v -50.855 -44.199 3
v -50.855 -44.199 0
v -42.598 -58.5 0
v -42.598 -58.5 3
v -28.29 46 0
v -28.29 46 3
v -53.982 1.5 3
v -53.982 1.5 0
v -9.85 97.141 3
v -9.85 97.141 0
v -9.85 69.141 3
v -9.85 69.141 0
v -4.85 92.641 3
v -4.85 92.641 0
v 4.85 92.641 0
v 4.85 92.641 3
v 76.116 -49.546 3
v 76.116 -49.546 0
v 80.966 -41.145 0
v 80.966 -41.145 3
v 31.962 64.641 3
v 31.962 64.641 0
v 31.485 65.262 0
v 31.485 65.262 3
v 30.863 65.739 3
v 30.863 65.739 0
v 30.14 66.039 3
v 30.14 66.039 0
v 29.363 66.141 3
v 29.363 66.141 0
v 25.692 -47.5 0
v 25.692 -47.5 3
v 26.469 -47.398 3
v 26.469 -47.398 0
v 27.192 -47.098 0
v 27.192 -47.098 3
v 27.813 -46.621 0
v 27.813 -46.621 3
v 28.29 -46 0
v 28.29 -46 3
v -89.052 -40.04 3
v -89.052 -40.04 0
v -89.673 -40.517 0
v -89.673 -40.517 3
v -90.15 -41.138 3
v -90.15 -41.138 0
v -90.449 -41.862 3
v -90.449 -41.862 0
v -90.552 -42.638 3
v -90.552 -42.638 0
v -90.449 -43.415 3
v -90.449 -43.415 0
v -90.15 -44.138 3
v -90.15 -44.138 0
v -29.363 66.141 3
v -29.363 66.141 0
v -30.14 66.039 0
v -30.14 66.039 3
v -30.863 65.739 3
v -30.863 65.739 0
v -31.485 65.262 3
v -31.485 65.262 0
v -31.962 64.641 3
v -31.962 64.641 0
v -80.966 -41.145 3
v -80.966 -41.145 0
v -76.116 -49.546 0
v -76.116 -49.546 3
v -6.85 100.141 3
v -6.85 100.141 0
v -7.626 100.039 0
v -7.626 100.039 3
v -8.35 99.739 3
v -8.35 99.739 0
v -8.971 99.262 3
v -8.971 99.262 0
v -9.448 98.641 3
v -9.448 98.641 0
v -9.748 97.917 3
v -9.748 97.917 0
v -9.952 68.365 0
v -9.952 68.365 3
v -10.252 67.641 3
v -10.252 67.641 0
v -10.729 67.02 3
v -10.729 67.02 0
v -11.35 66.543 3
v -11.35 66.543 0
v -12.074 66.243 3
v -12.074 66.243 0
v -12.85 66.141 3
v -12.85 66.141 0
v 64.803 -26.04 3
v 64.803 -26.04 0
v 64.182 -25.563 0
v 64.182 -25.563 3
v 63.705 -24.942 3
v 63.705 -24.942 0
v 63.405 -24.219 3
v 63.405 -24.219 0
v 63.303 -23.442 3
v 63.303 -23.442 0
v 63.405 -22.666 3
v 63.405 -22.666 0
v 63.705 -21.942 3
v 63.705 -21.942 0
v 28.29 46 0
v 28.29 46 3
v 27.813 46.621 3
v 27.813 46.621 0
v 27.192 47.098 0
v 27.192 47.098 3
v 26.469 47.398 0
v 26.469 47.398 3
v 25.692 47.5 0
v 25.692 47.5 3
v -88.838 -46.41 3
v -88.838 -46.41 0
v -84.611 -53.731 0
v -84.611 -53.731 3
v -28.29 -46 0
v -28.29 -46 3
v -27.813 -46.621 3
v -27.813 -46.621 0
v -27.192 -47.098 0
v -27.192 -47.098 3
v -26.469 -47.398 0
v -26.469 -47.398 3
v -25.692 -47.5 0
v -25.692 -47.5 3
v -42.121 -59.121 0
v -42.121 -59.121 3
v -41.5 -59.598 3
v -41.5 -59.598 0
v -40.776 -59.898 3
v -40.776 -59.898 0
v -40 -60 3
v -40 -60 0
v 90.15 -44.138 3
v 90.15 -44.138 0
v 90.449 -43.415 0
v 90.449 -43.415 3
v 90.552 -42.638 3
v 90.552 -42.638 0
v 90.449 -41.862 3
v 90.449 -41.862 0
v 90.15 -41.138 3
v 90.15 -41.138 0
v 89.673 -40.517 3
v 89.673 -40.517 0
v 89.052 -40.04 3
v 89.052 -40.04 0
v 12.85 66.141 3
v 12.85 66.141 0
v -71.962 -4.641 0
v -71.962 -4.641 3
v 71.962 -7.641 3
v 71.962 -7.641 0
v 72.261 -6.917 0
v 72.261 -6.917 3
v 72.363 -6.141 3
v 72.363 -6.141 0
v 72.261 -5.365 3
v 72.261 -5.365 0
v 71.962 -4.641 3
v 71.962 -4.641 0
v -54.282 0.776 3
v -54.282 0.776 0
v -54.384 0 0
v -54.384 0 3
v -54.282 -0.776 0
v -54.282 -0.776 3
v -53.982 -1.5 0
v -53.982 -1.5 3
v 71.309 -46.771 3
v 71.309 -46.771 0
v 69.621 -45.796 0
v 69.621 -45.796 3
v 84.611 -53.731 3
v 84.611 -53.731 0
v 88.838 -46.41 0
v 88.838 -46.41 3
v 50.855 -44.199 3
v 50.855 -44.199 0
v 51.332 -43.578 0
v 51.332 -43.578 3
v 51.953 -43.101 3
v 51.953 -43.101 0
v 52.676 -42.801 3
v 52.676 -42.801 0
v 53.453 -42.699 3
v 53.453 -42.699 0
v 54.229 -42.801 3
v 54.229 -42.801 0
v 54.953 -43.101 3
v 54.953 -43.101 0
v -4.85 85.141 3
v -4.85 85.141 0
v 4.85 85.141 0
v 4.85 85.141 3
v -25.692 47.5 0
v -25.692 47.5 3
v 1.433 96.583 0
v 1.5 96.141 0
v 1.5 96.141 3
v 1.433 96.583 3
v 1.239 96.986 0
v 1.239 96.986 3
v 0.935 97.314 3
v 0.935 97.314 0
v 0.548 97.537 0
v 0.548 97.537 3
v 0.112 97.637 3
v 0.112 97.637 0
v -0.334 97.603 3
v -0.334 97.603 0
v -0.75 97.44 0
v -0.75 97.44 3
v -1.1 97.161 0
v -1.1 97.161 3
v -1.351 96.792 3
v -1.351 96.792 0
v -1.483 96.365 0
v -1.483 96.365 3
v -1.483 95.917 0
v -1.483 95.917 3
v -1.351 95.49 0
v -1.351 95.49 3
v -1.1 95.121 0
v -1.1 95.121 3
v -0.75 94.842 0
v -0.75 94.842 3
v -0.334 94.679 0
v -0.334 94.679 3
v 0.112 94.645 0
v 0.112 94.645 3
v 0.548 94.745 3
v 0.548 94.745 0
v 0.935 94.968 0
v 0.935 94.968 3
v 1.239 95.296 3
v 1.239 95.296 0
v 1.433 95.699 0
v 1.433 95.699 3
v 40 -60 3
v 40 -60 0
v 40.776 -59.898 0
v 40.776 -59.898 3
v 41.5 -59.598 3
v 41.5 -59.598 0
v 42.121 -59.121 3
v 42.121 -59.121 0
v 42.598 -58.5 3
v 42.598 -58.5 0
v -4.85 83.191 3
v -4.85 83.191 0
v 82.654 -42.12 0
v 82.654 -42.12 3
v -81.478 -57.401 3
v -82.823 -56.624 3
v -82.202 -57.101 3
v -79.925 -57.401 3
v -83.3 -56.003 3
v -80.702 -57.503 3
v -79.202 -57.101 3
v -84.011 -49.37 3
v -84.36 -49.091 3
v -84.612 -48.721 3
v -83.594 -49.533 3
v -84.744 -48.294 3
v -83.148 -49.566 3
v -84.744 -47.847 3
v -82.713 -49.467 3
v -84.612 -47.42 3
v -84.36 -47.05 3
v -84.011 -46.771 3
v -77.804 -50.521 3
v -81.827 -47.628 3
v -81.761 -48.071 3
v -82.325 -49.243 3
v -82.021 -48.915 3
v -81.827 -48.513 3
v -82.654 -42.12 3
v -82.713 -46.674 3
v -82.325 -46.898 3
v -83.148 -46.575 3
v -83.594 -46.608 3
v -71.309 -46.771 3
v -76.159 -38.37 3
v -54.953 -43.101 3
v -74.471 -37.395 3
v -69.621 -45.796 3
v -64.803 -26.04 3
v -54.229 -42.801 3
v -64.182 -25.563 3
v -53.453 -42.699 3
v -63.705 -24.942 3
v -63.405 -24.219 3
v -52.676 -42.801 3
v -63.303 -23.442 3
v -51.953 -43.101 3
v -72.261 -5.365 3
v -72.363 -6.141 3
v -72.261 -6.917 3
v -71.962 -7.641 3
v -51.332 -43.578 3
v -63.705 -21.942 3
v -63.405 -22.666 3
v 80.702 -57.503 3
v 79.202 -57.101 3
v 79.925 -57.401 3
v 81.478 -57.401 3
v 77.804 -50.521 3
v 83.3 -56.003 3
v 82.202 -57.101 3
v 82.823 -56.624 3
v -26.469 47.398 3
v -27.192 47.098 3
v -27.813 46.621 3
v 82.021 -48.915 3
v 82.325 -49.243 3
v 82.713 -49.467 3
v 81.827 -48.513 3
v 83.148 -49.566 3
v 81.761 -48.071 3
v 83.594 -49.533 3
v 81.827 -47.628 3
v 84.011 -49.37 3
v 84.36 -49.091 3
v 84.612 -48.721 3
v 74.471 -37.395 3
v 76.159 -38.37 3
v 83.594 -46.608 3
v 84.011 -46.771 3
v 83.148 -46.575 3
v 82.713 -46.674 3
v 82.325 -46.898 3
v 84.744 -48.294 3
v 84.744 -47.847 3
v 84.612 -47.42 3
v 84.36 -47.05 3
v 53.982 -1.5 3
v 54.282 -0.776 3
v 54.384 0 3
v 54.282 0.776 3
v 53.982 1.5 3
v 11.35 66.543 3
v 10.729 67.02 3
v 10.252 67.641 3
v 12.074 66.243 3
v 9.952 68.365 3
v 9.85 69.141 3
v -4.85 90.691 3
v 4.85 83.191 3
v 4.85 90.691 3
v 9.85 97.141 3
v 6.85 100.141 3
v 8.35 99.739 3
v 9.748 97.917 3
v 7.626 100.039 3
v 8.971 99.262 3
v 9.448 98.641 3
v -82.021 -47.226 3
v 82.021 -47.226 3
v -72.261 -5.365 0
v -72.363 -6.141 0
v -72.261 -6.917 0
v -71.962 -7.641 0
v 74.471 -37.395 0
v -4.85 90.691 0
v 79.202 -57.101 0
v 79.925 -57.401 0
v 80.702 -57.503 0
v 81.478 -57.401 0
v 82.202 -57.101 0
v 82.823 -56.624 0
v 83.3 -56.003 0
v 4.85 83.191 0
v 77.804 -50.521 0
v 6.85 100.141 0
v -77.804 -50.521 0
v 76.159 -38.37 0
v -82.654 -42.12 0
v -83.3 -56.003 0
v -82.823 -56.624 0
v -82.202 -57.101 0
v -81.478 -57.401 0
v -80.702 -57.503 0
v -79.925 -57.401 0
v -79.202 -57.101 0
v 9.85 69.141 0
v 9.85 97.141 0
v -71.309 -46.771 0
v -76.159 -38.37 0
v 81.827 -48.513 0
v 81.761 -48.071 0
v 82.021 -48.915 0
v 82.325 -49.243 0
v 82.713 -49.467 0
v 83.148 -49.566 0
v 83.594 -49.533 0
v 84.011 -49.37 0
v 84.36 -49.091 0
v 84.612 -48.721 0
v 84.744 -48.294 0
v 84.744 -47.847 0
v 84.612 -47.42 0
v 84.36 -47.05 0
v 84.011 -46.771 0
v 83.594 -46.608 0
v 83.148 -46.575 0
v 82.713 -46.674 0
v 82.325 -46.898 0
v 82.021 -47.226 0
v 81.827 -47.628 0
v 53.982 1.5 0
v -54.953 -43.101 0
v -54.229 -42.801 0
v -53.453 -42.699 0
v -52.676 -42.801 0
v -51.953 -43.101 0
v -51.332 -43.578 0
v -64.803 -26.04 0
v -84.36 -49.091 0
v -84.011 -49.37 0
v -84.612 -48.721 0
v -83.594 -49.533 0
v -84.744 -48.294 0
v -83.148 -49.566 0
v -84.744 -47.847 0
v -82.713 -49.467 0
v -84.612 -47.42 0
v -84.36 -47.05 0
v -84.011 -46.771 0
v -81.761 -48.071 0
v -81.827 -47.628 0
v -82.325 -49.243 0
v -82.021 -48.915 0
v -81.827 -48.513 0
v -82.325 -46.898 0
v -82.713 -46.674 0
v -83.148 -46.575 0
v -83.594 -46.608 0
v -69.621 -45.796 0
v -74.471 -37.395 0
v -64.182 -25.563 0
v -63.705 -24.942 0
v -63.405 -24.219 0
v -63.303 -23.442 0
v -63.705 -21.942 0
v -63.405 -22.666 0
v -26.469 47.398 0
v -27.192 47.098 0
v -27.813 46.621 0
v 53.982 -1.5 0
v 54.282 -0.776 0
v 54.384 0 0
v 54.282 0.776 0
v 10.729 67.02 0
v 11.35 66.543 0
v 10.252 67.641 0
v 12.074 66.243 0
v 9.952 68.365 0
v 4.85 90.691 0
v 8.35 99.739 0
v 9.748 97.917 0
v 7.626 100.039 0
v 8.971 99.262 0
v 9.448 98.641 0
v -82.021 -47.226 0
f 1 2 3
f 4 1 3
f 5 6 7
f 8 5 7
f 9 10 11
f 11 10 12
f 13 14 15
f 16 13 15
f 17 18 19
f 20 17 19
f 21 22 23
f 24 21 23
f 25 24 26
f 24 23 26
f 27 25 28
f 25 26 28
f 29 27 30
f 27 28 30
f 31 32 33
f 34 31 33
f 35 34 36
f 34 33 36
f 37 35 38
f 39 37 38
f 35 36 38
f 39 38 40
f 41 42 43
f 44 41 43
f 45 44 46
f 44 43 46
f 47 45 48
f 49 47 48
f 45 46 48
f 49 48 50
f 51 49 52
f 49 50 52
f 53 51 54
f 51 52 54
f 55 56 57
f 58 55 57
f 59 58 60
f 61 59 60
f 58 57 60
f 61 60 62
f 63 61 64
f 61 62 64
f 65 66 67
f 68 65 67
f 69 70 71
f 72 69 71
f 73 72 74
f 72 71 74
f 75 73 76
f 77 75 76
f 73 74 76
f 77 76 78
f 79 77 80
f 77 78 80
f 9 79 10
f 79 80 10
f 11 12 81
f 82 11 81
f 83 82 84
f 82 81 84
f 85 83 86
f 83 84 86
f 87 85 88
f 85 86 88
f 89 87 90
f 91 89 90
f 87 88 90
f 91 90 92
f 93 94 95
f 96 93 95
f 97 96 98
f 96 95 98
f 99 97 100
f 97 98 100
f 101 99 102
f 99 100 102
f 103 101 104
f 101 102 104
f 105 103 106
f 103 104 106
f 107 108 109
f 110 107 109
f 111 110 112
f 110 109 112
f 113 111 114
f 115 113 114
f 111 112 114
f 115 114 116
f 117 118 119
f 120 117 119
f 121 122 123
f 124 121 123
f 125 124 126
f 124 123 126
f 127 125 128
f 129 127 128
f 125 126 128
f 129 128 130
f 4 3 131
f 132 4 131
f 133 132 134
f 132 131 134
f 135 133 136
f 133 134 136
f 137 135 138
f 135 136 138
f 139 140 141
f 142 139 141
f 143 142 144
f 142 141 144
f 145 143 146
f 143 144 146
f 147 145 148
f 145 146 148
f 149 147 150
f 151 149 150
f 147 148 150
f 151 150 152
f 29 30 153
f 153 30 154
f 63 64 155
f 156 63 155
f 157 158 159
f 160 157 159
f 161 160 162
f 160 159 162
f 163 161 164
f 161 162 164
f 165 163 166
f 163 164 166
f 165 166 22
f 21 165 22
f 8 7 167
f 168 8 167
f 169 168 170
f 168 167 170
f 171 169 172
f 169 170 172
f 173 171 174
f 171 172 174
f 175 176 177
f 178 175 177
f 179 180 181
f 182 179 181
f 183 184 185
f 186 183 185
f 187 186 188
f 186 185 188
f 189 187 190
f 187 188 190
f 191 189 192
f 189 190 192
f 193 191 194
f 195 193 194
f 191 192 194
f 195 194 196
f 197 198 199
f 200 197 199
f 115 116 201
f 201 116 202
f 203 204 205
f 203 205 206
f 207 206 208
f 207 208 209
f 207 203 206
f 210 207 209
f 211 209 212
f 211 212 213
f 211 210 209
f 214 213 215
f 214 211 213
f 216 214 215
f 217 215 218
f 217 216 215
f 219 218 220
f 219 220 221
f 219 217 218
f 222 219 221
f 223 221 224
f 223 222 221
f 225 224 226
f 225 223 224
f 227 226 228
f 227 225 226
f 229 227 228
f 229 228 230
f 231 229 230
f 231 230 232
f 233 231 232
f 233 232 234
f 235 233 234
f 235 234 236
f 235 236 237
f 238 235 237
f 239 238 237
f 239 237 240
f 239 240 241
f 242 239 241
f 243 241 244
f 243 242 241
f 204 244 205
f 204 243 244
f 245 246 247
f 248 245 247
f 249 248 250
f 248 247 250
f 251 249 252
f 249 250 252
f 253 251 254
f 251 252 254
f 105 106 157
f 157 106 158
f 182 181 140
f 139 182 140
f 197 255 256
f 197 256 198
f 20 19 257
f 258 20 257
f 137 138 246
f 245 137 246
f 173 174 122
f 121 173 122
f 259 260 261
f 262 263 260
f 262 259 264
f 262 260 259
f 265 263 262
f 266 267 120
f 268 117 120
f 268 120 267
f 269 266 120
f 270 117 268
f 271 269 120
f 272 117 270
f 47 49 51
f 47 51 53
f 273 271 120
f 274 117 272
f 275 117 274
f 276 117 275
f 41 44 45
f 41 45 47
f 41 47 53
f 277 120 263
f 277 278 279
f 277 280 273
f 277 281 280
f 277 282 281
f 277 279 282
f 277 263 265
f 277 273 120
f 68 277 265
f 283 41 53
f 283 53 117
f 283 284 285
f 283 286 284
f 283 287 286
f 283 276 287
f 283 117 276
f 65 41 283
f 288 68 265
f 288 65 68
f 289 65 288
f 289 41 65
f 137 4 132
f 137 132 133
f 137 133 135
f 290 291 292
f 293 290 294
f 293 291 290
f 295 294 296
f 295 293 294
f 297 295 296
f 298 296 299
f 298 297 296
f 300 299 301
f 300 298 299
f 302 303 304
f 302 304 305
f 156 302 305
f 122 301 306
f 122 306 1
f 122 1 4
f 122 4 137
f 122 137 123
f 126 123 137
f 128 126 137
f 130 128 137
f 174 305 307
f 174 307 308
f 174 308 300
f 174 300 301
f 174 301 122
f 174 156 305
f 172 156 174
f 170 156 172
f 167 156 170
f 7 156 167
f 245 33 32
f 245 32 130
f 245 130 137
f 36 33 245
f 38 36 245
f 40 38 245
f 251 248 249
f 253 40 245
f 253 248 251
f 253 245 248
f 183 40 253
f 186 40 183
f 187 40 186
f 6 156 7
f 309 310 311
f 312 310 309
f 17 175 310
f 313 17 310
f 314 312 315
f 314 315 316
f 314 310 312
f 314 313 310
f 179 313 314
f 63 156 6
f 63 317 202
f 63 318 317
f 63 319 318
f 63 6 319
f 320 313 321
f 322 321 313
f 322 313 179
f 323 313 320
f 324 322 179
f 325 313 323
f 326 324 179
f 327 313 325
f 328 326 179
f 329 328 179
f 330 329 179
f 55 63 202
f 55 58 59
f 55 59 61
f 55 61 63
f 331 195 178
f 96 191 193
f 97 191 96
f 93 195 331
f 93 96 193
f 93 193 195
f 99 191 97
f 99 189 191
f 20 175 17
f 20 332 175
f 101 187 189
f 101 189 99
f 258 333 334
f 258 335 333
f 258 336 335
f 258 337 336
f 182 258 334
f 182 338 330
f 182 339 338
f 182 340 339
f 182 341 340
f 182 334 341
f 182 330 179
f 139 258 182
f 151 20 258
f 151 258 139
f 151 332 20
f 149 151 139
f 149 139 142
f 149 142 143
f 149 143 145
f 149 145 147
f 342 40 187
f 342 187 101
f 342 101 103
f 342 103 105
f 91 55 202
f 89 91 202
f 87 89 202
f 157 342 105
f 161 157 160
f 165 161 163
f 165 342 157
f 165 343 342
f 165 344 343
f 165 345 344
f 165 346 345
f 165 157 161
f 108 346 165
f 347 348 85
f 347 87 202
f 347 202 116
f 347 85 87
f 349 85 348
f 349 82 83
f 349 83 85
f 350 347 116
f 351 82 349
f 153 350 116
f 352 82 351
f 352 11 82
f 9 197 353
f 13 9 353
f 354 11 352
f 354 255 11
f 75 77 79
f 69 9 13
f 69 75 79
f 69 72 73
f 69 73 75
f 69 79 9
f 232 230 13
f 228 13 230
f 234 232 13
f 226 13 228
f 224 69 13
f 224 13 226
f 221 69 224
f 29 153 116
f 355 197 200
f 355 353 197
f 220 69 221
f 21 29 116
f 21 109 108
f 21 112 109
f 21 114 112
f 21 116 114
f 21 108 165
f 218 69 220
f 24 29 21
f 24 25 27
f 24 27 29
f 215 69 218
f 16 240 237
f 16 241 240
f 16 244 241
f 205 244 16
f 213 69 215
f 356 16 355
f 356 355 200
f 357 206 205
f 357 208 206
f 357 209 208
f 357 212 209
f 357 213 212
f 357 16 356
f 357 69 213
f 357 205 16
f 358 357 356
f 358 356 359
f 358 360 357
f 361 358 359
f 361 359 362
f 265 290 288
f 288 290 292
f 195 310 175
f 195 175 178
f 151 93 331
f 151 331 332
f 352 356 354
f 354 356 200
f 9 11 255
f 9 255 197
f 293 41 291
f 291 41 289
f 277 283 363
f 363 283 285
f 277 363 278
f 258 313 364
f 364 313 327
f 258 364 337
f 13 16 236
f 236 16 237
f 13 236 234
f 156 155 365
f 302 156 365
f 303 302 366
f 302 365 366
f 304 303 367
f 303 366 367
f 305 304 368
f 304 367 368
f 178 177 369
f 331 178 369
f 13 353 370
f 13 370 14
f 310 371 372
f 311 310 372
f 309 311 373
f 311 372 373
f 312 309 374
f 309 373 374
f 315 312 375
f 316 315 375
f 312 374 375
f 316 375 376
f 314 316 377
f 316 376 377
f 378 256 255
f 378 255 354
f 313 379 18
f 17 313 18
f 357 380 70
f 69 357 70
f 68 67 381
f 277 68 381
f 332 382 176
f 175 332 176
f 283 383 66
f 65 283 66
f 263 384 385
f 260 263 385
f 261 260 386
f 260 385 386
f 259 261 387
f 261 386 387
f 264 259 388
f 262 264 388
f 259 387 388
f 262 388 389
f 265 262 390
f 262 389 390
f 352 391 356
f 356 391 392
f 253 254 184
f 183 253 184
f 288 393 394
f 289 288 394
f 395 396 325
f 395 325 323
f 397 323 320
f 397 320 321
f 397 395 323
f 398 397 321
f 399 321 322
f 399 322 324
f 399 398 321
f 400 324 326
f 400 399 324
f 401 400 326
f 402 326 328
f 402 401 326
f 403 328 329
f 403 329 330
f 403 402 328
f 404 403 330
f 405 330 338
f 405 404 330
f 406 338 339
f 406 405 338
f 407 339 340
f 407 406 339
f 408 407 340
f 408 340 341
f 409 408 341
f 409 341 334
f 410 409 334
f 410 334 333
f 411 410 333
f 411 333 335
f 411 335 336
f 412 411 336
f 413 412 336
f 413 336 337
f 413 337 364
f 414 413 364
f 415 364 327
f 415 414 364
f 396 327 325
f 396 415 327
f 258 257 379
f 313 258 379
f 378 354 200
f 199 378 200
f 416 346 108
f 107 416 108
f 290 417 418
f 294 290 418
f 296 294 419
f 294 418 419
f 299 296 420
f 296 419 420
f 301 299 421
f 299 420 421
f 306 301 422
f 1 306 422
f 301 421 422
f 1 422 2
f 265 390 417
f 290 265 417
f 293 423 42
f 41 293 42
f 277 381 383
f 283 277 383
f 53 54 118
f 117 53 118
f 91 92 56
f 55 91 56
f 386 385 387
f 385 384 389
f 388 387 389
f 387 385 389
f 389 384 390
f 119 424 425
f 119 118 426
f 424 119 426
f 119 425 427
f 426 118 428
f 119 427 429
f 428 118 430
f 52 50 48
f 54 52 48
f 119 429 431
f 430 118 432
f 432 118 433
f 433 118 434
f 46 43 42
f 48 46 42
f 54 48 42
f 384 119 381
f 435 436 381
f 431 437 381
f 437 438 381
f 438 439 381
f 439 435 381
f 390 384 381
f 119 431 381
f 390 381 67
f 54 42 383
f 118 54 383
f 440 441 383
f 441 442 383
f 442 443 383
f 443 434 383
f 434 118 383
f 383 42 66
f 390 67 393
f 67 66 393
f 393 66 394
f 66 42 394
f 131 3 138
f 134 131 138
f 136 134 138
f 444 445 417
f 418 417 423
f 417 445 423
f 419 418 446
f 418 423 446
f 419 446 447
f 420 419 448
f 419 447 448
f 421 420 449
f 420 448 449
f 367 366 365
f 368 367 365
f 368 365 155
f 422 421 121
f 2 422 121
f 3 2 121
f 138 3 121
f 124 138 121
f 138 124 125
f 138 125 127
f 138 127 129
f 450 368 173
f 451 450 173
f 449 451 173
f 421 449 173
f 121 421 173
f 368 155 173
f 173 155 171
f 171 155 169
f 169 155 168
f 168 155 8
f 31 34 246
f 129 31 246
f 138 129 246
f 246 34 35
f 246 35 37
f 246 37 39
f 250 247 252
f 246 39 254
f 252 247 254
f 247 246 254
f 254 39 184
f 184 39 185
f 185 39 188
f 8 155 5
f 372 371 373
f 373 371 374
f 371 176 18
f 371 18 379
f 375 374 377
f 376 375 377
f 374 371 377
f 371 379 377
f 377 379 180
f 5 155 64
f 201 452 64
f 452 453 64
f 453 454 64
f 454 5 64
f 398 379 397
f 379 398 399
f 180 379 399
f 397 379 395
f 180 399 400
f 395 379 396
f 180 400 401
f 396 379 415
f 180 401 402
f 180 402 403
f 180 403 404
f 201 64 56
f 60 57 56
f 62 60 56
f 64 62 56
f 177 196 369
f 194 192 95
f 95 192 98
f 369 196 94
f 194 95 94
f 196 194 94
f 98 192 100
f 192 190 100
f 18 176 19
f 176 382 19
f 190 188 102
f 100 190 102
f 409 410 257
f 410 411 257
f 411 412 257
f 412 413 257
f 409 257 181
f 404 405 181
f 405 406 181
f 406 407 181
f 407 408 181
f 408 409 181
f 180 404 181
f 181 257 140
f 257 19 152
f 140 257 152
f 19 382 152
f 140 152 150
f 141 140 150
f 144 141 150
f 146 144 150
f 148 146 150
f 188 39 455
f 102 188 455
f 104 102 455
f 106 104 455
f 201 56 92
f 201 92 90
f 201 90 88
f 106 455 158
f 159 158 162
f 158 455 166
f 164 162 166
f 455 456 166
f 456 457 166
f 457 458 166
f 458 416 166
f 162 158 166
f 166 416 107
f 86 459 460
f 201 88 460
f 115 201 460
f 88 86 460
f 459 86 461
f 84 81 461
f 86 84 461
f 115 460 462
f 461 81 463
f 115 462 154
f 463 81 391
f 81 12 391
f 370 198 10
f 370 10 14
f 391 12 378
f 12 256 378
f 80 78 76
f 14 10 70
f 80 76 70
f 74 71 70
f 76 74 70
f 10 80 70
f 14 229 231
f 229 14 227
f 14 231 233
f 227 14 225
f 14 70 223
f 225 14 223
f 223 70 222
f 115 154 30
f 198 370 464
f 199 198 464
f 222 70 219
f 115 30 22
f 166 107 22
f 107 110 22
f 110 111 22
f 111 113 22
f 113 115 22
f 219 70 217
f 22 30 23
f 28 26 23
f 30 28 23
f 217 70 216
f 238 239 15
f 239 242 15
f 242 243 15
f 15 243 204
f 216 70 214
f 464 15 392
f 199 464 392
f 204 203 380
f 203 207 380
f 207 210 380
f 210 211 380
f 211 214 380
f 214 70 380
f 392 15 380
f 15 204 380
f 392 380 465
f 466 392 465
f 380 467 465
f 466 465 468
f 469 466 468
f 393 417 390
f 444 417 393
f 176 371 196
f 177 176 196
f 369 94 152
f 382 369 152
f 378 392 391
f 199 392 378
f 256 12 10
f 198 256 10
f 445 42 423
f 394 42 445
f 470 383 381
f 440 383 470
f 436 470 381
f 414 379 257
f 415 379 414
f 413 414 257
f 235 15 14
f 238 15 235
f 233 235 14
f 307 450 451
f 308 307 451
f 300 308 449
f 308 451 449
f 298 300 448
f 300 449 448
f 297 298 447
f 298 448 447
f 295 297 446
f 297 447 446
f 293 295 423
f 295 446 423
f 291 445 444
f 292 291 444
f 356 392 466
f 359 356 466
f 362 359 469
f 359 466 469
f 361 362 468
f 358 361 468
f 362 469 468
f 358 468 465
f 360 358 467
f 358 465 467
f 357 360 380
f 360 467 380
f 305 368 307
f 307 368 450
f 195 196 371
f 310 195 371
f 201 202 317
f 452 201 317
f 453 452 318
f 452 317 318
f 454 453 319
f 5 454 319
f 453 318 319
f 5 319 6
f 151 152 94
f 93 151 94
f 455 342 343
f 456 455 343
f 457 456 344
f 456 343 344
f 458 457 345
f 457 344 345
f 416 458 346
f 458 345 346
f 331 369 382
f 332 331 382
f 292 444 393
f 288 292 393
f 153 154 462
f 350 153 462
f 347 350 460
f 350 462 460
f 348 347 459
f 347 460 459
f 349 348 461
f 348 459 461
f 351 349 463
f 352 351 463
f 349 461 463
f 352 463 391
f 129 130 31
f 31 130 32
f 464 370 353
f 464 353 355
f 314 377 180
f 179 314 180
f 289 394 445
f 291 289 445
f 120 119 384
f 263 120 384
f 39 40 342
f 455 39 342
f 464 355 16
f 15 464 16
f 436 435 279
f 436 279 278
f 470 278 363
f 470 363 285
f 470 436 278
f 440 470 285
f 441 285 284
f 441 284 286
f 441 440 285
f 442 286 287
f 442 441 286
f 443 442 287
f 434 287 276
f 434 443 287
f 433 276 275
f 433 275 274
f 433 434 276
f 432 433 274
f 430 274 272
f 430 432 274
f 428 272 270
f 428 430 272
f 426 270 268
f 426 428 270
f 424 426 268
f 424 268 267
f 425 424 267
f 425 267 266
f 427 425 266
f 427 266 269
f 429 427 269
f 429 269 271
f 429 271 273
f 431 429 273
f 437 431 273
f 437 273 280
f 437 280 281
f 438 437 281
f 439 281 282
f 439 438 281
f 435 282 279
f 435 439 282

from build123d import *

# Parameters (mm, degrees)
SKETCH_1_R          = 1.5
SKETCH_1_W          = 9.7
SKETCH_1_H          = 1.95
EXTRUDE_3_DEPTH     = 3
CUT_EXTRUDE_1_DEPTH = 10


with BuildPart() as part:
    # Эскиз1 → Бобышка-Вытянуть3 (new body)
    with BuildSketch(Plane.XY):
        with BuildLine():
            Line((-88.837912602, -46.410254038), (-84.611415294, -53.730762114))
            Line((-84.611415294, -53.730762114), (-83.299663948, -56.002782092))
            ThreePointArc((-83.299663948, -56.002782092), (-81.478044872, -57.40055957), (-79.201587737, -57.100858303))
            Line((-79.201587737, -57.100858303), (-54.952876431, -43.100858303))
            ThreePointArc((-54.952876431, -43.100858303), (-52.676419295, -42.801157035), (-50.854800219, -44.198934514))
            Line((-50.854800219, -44.198934514), (-42.598076211, -58.5))
            ThreePointArc((-42.598076211, -58.5), (-41.5, -59.598076211), (-40, -60))
            Line((-40, -60), (40, -60))
            ThreePointArc((40, -60), (41.5, -59.598076211), (42.598076211, -58.5))
            Line((42.598076211, -58.5), (50.854800219, -44.198934514))
            ThreePointArc((50.854800219, -44.198934514), (52.676419295, -42.801157035), (54.952876431, -43.100858303))
            Line((54.952876431, -43.100858303), (79.201587737, -57.100858303))
            ThreePointArc((79.201587737, -57.100858303), (81.478044872, -57.40055957), (83.299663948, -56.002782092))
            Line((83.299663948, -56.002782092), (84.611415294, -53.730762114))
            Line((84.611415294, -53.730762114), (88.837912602, -46.410254038))
            Line((88.837912602, -46.410254038), (90.149663948, -44.13823406))
            ThreePointArc((90.149663948, -44.13823406), (90.449365215, -41.861776924), (89.051587737, -40.040157848))
            Line((89.051587737, -40.040157848), (64.802876431, -26.040157848))
            ThreePointArc((64.802876431, -26.040157848), (63.405098952, -24.218538772), (63.704800219, -21.942081637))
            Line((63.704800219, -21.942081637), (71.961524227, -7.641016151))
            ThreePointArc((71.961524227, -7.641016151), (72.363448016, -6.141016151), (71.961524227, -4.641016151))
            Line((71.961524227, -4.641016151), (31.961524227, 64.641016151))
            ThreePointArc((31.961524227, 64.641016151), (30.863448016, 65.739092363), (29.363448016, 66.141016151))
            Line((29.363448016, 66.141016151), (12.85, 66.141016151))
            ThreePointArc((12.85, 66.141016151), (10.728679656, 67.019695808), (9.85, 69.141016151))
            Line((9.85, 69.141016151), (9.85, 97.141016151))
            ThreePointArc((9.85, 97.141016151), (8.971320344, 99.262336495), (6.85, 100.141016151))
            Line((6.85, 100.141016151), (4.226497308, 100.141016151))
            Line((4.226497308, 100.141016151), (-4.226497308, 100.141016151))
            Line((-4.226497308, 100.141016151), (-6.85, 100.141016151))
            ThreePointArc((-6.85, 100.141016151), (-8.971320344, 99.262336495), (-9.85, 97.141016151))
            Line((-9.85, 97.141016151), (-9.85, 69.141016151))
            ThreePointArc((-9.85, 69.141016151), (-10.728679656, 67.019695808), (-12.85, 66.141016151))
            Line((-12.85, 66.141016151), (-29.363448016, 66.141016151))
            ThreePointArc((-29.363448016, 66.141016151), (-30.863448016, 65.739092363), (-31.961524227, 64.641016151))
            Line((-31.961524227, 64.641016151), (-71.961524227, -4.641016151))
            ThreePointArc((-71.961524227, -4.641016151), (-72.363448016, -6.141016151), (-71.961524227, -7.641016151))
            Line((-71.961524227, -7.641016151), (-63.704800219, -21.942081637))
            ThreePointArc((-63.704800219, -21.942081637), (-63.405098952, -24.218538772), (-64.802876431, -26.040157848))
            Line((-64.802876431, -26.040157848), (-89.051587737, -40.040157848))
            ThreePointArc((-89.051587737, -40.040157848), (-90.449365215, -41.861776924), (-90.149663948, -44.13823406))
            Line((-90.149663948, -44.13823406), (-88.837912602, -46.410254038))
        make_face()
        with Locations((-83.260562333, -48.070508076)):
            Circle(SKETCH_1_R, mode=Mode.SUBTRACT)
        with Locations(Location((83.260562333, -48.070508076, 0), (0, 0, 180))):
            Circle(SKETCH_1_R, mode=Mode.SUBTRACT)
        with Locations((0, 96.141016151)):
            Circle(SKETCH_1_R, mode=Mode.SUBTRACT)
        Polygon((-77.804473419, -50.520731284), (-82.654473419, -42.120284867), (-80.965723882, -41.145284867), (-76.115723882, -49.545731284), align=None, mode=Mode.SUBTRACT)
        Polygon((-71.309282891, -46.770731284), (-76.159282891, -38.370284867), (-74.470533354, -37.395284867), (-69.620533354, -45.795731284), align=None, mode=Mode.SUBTRACT)
        Polygon((69.620533354, -45.795731284), (74.470533354, -37.395284867), (76.159282891, -38.370284867), (71.309282891, -46.770731284), align=None, mode=Mode.SUBTRACT)
        Polygon((76.115723882, -49.545731284), (80.965723882, -41.145284867), (82.654473419, -42.120284867), (77.804473419, -50.520731284), align=None, mode=Mode.SUBTRACT)
        with Locations((0, 91.666016151)):
            Rectangle(SKETCH_1_W, SKETCH_1_H, mode=Mode.SUBTRACT)
        with Locations((0, 84.166016151)):
            Rectangle(SKETCH_1_W, SKETCH_1_H, mode=Mode.SUBTRACT)
    extrude(amount=EXTRUDE_3_DEPTH)

    # Эскиз2 → Вырез-Вытянуть1 (cut)
    with BuildSketch(Plane.XY.offset(3)):
        with BuildLine():
            Line((28.29016319, -46), (53.982250169, -1.5))
            ThreePointArc((53.982250169, -1.5), (54.384173958, 0), (53.982250169, 1.5))
            Line((53.982250169, 1.5), (28.29016319, 46))
            ThreePointArc((28.29016319, 46), (27.192086979, 47.098076211), (25.692086979, 47.5))
            Line((25.692086979, 47.5), (-25.692086979, 47.5))
            ThreePointArc((-25.692086979, 47.5), (-27.192086979, 47.098076211), (-28.29016319, 46))
            Line((-28.29016319, 46), (-53.982250169, 1.5))
            ThreePointArc((-53.982250169, 1.5), (-54.384173958, 0), (-53.982250169, -1.5))
            Line((-53.982250169, -1.5), (-28.29016319, -46))
            ThreePointArc((-28.29016319, -46), (-27.192086979, -47.098076211), (-25.692086979, -47.5))
            Line((-25.692086979, -47.5), (25.692086979, -47.5))
            ThreePointArc((25.692086979, -47.5), (27.192086979, -47.098076211), (28.29016319, -46))
        make_face()
    extrude(amount=-CUT_EXTRUDE_1_DEPTH, mode=Mode.SUBTRACT)


solid = part.part
